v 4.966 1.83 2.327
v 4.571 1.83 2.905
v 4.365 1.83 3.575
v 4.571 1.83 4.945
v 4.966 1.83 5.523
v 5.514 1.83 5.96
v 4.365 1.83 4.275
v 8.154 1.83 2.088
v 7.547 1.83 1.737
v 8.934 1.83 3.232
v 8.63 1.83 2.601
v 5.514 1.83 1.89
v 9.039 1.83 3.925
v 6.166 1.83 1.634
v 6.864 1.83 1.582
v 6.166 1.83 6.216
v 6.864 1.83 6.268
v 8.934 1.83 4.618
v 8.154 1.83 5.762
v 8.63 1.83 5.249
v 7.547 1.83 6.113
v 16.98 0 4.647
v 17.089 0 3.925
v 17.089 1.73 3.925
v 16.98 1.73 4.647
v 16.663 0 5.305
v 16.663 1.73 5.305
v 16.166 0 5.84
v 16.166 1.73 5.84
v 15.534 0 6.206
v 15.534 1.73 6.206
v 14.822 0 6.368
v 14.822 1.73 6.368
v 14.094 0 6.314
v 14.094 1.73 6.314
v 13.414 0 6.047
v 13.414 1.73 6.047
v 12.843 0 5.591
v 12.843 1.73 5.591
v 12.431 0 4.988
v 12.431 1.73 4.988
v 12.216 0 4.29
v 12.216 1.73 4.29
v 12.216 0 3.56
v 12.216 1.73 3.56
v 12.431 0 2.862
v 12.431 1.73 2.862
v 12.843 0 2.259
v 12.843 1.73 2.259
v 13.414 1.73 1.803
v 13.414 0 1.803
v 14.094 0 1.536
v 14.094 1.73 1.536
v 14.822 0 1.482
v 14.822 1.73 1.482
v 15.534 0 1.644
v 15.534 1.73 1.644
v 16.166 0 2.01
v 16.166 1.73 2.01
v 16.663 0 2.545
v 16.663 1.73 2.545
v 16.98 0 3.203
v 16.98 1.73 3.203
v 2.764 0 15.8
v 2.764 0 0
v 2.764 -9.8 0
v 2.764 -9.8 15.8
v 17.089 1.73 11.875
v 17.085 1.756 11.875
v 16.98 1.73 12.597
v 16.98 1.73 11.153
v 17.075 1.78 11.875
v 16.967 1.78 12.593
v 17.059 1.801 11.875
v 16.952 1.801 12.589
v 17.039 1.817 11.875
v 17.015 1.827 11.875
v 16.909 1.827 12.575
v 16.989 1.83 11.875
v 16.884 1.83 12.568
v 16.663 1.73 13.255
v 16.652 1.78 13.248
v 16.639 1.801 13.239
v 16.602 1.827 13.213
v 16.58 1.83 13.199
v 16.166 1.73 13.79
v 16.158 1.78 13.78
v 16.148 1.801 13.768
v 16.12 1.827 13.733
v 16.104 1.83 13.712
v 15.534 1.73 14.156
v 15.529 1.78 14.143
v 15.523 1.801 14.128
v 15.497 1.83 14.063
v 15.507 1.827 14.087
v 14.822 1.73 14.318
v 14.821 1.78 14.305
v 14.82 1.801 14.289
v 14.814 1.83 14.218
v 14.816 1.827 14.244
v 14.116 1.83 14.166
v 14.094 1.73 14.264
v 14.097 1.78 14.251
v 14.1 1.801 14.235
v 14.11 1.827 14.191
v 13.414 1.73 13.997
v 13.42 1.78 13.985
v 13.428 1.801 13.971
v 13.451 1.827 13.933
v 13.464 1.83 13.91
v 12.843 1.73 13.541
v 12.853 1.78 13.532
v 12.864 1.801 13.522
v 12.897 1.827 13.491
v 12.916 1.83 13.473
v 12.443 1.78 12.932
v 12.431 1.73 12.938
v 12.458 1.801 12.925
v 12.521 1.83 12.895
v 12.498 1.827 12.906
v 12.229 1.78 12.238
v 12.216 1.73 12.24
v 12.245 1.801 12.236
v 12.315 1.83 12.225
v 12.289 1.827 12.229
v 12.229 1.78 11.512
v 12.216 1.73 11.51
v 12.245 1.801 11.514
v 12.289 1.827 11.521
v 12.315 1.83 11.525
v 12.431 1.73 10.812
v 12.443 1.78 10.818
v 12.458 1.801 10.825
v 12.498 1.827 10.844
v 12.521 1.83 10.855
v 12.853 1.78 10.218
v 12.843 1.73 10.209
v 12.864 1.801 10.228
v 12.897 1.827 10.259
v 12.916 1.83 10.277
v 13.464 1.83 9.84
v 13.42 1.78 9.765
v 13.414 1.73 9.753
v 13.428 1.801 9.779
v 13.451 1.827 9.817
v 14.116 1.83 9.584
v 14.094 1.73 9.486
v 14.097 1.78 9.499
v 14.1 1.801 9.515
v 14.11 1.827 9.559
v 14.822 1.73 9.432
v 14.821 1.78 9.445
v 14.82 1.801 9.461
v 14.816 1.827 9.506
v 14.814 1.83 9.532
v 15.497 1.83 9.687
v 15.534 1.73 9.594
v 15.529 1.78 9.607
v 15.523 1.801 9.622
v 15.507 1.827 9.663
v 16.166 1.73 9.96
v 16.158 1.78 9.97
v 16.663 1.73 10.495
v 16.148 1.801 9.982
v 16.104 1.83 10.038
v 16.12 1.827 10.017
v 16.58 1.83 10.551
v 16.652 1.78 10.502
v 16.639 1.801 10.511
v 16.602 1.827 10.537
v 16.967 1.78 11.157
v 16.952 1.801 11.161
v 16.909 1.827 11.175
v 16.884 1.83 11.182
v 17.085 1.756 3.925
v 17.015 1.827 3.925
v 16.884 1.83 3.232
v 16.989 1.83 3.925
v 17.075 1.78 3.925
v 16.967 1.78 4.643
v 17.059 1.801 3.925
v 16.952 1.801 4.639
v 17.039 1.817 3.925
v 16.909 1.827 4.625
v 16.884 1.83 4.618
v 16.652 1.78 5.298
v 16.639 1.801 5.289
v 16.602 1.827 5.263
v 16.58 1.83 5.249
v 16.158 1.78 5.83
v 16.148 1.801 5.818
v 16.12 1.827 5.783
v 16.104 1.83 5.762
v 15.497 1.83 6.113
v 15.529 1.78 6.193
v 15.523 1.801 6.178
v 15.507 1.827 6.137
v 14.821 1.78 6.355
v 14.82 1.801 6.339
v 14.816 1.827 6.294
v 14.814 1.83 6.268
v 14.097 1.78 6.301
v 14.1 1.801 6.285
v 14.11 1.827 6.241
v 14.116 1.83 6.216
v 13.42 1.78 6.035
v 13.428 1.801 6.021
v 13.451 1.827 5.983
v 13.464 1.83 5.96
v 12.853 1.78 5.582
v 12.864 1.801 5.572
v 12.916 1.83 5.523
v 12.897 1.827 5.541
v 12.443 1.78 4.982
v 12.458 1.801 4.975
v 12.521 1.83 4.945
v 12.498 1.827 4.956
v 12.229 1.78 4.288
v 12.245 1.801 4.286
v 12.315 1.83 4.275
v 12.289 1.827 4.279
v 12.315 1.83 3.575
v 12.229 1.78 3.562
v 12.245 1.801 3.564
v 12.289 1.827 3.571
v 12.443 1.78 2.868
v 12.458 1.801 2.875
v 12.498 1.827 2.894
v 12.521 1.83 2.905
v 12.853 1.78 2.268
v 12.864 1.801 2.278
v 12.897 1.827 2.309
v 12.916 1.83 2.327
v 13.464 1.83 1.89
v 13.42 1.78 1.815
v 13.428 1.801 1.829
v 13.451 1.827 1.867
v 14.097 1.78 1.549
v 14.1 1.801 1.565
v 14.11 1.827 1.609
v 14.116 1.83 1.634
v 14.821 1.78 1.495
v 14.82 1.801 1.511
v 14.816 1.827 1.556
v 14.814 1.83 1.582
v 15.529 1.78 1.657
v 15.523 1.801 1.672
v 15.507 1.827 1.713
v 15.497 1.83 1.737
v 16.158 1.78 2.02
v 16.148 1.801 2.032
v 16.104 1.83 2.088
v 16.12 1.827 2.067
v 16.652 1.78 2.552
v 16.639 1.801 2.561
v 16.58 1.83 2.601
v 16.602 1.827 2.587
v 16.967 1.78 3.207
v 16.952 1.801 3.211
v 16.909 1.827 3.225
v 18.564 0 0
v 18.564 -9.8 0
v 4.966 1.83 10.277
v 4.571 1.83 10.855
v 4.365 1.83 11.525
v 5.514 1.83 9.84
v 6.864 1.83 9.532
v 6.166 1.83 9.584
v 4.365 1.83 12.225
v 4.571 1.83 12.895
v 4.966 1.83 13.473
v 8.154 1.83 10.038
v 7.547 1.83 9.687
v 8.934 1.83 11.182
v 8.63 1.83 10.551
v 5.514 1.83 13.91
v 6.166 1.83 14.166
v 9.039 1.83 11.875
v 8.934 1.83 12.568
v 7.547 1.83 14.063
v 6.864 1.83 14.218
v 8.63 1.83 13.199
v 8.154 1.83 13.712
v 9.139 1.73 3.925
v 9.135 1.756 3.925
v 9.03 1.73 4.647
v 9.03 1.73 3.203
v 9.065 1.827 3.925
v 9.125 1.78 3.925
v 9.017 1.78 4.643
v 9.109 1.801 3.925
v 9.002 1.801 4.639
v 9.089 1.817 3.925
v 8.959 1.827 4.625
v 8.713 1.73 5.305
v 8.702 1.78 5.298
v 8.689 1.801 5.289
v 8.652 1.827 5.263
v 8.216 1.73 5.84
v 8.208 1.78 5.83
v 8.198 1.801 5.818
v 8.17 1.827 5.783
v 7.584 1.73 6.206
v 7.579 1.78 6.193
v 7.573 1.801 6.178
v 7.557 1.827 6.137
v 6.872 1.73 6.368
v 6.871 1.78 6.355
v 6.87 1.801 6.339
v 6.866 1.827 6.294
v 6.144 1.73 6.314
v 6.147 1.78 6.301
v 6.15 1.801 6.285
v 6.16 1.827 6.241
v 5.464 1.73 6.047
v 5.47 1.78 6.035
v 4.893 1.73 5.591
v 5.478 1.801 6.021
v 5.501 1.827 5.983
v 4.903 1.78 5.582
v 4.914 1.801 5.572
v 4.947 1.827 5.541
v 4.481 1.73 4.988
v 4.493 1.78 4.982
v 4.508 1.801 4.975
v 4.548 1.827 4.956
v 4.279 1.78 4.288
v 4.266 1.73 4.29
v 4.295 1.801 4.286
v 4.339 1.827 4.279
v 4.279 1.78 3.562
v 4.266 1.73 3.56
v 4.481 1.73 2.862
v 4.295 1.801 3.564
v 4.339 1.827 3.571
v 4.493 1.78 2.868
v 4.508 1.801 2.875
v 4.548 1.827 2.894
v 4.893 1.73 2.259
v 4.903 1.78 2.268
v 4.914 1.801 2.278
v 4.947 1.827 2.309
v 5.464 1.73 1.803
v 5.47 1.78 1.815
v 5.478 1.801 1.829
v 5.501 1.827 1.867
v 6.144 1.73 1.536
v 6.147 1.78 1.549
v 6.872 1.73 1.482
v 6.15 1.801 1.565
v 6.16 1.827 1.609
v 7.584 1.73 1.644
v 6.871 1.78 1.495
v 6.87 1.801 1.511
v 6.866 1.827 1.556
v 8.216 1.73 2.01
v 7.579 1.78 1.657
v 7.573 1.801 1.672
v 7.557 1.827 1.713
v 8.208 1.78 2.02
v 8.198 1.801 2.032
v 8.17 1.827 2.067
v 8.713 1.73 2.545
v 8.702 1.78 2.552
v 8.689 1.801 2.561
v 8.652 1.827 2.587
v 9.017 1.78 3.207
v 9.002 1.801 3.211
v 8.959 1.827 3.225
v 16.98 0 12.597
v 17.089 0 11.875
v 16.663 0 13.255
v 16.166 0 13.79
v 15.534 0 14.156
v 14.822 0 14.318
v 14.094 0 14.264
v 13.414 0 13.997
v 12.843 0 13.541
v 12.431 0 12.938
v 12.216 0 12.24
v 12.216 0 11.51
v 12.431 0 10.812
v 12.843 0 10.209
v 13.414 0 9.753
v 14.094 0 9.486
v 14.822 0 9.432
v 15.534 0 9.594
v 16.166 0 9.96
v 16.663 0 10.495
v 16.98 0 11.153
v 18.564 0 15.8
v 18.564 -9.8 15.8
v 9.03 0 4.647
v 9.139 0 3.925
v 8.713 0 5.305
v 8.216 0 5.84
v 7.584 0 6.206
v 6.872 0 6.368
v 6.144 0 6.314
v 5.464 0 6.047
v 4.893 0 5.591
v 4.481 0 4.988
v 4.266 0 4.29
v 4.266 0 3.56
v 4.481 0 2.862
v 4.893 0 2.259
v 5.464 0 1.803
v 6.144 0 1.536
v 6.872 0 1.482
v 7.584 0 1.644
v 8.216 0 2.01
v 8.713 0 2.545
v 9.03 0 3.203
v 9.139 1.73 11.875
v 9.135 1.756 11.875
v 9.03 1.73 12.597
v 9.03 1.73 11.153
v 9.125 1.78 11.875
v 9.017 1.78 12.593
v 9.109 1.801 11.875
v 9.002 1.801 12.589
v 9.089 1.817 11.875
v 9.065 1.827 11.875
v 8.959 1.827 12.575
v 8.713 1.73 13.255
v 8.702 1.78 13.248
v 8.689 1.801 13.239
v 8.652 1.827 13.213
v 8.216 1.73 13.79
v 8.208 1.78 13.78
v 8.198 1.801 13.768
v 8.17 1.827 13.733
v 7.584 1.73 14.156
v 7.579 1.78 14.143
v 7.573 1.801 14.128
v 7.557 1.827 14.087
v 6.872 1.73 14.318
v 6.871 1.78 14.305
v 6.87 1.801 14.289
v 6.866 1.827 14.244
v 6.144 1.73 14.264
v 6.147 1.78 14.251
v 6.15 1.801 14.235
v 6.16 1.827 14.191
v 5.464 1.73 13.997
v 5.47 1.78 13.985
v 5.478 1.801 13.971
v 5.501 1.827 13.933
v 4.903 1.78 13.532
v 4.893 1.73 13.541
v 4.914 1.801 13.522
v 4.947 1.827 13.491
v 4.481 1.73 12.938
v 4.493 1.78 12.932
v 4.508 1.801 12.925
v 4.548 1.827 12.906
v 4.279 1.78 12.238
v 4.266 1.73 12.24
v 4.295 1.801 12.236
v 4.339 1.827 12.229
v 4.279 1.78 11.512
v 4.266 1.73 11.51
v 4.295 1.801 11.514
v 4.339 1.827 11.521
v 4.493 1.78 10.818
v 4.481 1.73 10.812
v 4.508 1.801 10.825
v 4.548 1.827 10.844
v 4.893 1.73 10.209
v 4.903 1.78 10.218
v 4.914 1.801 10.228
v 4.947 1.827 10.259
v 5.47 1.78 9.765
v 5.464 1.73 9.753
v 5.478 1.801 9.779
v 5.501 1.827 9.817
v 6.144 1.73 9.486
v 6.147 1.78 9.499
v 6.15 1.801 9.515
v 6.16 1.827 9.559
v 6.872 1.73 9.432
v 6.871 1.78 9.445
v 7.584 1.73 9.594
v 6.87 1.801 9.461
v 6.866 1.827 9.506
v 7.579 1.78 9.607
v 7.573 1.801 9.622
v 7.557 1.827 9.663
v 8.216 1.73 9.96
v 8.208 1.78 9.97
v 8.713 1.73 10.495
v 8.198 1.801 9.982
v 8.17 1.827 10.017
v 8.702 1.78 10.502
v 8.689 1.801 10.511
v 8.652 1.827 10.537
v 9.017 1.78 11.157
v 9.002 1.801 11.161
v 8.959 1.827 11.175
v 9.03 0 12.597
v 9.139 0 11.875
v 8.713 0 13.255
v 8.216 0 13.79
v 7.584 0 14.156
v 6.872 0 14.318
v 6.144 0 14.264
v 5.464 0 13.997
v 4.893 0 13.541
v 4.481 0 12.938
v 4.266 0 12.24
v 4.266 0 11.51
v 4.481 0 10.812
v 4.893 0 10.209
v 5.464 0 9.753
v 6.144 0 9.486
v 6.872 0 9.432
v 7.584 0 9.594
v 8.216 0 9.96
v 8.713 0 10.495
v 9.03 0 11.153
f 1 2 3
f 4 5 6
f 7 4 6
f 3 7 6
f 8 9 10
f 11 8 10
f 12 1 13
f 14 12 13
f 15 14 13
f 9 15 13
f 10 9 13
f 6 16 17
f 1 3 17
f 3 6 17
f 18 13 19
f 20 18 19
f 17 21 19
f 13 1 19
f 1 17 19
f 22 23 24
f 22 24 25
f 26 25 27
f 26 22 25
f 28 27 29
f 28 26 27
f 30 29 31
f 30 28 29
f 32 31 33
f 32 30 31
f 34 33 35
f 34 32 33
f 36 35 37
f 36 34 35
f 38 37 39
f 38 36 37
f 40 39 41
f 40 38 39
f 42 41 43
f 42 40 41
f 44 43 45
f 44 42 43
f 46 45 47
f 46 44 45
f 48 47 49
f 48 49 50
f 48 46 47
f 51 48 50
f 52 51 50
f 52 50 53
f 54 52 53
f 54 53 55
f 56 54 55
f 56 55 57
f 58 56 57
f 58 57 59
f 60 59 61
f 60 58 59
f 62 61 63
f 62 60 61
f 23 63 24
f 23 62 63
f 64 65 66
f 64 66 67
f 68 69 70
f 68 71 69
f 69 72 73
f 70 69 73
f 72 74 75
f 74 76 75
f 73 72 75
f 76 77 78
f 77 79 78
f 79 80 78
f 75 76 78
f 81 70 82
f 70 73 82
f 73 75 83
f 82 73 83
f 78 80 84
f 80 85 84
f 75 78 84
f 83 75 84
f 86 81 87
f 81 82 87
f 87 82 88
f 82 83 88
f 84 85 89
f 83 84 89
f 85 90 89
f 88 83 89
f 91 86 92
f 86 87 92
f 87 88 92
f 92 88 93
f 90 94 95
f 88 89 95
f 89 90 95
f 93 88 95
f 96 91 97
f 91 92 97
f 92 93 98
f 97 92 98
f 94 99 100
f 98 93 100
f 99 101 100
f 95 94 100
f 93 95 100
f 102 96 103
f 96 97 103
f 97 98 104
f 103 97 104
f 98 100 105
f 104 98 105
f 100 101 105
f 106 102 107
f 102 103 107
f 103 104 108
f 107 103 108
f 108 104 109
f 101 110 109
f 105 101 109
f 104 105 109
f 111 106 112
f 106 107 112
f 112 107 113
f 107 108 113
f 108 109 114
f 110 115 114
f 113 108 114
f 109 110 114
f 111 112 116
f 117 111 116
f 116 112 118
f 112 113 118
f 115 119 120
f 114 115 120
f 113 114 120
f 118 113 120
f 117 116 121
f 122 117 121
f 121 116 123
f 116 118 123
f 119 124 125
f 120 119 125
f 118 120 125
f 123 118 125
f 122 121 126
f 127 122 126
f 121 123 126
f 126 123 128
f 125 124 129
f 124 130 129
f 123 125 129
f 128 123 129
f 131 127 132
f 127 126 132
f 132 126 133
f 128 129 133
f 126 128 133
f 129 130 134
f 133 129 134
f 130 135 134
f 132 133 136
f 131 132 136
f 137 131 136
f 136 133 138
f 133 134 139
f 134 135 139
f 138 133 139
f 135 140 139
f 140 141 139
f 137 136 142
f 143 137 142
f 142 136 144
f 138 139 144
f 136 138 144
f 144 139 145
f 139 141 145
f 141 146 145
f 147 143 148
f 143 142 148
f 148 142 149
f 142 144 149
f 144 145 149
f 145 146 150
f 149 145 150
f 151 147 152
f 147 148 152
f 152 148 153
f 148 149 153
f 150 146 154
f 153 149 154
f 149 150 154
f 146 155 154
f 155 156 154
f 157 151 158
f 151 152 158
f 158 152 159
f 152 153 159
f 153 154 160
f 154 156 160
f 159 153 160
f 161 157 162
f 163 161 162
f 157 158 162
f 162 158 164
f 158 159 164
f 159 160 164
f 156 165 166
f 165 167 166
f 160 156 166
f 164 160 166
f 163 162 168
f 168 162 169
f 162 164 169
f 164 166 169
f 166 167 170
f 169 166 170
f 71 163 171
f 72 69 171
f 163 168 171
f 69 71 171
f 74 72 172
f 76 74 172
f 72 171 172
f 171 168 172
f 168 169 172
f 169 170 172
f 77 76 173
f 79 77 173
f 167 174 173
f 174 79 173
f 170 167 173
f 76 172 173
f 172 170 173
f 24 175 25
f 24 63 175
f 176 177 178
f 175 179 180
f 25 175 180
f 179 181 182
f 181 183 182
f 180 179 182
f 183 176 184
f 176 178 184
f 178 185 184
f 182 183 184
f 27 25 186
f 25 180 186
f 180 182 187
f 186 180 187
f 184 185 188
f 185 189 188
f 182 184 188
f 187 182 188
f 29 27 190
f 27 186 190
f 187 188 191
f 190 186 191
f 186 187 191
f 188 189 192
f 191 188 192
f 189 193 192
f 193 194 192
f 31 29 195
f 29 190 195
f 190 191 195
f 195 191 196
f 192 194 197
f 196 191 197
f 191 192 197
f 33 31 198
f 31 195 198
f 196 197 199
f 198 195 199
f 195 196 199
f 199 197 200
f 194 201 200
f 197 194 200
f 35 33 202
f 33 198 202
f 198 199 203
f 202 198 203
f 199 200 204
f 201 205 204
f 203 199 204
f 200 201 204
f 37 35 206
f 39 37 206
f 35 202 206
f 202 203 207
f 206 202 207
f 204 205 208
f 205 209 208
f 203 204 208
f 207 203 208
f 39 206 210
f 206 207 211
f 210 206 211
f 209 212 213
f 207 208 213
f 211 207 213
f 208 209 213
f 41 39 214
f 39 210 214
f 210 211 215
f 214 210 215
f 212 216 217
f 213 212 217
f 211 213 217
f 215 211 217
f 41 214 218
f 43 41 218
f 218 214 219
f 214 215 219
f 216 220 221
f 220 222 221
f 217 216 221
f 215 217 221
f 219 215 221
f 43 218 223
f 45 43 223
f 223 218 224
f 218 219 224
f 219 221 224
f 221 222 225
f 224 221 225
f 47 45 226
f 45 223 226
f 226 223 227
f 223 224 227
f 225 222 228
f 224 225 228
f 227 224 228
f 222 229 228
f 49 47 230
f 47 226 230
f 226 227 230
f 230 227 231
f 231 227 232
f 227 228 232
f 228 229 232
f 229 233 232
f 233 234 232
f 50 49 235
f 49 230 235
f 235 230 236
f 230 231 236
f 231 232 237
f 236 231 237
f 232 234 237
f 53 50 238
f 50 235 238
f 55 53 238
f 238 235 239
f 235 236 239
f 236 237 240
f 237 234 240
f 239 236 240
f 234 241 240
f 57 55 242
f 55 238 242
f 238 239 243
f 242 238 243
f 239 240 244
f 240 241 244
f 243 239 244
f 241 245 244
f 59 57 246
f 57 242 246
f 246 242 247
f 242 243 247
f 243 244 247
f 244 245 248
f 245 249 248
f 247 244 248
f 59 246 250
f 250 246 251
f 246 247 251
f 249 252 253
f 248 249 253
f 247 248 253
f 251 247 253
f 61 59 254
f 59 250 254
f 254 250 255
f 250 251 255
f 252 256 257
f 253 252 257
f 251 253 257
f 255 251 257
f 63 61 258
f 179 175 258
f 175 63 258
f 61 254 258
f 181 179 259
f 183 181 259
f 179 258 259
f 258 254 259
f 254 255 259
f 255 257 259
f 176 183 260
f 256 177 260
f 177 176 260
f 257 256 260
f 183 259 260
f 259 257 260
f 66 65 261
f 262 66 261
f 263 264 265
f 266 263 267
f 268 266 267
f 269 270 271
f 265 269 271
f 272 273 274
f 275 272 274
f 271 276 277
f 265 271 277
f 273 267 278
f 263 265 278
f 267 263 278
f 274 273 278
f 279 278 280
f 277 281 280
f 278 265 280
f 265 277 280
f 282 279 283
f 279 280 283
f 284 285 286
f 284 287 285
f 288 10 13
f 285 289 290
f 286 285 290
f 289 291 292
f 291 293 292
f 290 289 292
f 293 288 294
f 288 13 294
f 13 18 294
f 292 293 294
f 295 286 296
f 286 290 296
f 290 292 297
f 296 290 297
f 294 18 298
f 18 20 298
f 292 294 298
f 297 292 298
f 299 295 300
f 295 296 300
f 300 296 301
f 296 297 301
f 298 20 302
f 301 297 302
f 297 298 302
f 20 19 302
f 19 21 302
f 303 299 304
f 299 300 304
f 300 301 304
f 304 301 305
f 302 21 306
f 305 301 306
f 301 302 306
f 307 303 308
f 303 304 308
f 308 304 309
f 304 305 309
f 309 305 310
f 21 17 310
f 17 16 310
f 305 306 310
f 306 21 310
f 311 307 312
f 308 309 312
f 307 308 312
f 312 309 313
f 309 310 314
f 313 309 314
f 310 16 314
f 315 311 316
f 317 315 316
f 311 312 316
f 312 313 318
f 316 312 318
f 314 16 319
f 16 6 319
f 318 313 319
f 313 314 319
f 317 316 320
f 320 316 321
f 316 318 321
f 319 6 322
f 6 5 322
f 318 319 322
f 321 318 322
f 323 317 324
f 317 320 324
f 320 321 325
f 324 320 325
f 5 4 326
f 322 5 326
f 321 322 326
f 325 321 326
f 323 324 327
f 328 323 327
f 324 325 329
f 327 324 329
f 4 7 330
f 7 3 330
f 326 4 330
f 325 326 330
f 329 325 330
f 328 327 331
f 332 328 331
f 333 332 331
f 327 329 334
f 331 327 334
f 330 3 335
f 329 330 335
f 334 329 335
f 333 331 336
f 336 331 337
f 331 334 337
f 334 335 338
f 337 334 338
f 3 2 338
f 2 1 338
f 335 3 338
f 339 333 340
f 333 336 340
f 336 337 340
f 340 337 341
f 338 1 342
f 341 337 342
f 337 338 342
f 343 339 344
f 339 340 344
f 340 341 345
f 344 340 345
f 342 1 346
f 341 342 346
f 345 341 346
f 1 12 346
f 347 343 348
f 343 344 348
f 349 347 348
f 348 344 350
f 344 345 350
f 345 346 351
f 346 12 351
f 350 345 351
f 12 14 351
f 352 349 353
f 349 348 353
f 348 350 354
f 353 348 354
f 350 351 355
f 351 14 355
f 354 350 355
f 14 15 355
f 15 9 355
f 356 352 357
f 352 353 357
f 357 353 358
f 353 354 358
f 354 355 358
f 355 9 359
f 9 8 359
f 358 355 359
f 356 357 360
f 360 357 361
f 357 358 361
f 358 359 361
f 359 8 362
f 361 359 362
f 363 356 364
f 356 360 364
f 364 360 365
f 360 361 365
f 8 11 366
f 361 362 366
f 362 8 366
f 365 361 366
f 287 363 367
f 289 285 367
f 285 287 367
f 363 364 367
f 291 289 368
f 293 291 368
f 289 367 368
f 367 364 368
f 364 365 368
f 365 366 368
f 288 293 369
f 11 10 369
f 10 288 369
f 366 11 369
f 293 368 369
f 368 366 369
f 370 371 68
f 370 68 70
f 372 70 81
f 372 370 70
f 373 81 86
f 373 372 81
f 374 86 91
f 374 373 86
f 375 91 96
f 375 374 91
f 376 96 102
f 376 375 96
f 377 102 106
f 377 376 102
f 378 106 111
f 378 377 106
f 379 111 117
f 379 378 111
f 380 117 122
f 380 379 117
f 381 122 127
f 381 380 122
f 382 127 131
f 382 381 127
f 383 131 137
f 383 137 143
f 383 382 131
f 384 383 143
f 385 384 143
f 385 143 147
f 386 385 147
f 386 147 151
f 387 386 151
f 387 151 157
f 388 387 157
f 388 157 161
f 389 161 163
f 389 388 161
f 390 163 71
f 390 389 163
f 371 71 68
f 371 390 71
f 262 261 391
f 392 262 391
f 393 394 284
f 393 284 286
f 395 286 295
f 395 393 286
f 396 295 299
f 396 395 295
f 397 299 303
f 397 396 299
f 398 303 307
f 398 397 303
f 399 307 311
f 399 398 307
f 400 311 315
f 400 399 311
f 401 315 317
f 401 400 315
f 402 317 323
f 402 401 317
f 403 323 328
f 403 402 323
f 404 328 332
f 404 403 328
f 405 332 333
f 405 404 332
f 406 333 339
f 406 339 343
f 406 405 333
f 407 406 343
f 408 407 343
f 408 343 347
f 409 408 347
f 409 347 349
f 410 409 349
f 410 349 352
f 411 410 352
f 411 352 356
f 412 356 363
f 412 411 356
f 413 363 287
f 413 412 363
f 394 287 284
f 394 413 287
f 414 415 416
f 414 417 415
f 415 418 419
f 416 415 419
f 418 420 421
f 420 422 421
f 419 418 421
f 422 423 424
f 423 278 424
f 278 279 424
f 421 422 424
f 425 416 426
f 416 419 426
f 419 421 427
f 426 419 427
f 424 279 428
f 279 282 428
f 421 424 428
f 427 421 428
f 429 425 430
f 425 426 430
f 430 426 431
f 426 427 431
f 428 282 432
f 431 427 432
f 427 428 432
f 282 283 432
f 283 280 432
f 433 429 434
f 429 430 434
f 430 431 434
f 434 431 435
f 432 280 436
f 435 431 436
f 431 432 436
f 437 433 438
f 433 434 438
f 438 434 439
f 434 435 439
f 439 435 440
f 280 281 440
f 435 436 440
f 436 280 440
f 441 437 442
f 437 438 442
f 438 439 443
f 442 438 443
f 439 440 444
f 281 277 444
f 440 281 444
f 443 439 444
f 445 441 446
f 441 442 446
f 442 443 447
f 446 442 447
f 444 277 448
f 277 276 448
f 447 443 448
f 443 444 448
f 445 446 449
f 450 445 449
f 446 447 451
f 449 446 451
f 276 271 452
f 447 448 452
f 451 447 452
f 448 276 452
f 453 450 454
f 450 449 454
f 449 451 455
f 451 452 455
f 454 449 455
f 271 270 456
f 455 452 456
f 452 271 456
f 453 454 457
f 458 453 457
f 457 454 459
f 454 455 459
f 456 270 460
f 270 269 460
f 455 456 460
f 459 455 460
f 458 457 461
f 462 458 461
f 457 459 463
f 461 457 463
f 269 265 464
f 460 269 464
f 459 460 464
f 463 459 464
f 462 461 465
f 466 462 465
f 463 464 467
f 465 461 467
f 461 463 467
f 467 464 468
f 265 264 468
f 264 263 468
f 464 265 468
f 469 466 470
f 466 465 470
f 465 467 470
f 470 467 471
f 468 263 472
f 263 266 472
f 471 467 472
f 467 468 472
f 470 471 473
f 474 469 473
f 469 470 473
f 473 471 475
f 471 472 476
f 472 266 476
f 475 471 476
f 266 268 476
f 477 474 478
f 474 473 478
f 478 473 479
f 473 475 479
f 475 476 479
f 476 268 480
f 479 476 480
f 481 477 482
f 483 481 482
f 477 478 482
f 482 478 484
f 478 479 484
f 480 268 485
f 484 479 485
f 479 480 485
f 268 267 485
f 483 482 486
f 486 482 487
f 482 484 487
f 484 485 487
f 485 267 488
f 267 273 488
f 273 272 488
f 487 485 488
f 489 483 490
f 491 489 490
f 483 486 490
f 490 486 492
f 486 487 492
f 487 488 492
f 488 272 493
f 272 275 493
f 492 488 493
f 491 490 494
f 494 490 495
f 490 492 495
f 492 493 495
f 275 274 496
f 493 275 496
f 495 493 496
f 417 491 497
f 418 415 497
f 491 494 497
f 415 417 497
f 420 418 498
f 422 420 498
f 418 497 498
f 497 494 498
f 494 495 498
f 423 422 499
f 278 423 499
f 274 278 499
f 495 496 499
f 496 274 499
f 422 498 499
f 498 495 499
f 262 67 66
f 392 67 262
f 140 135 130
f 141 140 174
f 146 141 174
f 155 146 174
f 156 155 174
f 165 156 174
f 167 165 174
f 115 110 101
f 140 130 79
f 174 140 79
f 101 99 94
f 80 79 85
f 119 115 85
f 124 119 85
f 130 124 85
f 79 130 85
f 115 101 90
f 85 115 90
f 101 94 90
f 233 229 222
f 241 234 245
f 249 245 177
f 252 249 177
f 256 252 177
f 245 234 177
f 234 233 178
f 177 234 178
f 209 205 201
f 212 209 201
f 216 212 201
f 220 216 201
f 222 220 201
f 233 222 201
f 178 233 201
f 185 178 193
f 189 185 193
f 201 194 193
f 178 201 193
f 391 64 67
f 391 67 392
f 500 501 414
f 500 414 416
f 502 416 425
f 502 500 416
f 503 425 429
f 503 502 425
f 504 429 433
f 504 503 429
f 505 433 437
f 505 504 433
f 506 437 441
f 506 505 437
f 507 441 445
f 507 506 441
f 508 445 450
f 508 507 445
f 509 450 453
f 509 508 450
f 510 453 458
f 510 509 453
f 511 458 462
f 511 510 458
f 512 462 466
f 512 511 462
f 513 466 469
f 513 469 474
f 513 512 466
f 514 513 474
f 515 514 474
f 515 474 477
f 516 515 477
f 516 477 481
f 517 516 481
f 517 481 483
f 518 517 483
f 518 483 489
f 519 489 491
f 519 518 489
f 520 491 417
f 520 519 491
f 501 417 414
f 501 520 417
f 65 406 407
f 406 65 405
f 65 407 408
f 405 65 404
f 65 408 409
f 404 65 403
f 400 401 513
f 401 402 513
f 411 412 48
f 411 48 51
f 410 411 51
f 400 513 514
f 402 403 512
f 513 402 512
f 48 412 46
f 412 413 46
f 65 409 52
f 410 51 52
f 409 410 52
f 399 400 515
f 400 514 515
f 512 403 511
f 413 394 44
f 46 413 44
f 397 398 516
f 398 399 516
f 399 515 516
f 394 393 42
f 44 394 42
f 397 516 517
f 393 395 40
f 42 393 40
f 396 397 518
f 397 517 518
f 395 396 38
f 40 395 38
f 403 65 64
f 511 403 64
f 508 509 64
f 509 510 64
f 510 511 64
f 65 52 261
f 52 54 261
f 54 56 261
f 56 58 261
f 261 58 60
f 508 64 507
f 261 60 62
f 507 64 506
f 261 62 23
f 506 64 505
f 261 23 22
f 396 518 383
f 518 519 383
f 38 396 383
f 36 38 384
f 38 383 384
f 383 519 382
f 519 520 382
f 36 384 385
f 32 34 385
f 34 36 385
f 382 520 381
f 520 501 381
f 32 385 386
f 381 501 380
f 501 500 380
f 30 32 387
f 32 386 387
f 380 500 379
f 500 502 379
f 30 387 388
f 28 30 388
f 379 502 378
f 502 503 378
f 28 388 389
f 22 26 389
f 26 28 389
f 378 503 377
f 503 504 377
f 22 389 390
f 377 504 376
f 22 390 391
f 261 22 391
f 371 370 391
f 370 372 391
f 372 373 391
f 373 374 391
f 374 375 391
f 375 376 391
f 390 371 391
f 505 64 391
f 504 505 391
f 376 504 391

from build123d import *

# Parameters (mm, degrees)
F0_W     = 15.8
F0_H     = 15.8
F1_DEPTH = 9.8
F2_R     = 2.45
F3_DEPTH = 1.83
F4_R     = 0.1


with BuildPart() as f1:
    # F0 (on Front) → F1 (new body)
    with BuildSketch(Plane.XZ):
        with Locations((10.663698, 7.9)):
            Rectangle(F0_W, F0_H)
    extrude(amount=F1_DEPTH)

    # F2 (on Front) → F3 (join)
    with BuildSketch(Plane.XZ):
        with Locations((6.688698, 11.875)):
            Circle(F2_R)
        with Locations((14.638698, 11.875)):
            Circle(F2_R)
        with Locations((6.688698, 3.925)):
            Circle(F2_R)
        with Locations((14.638698, 3.925)):
            Circle(F2_R)
    extrude(amount=-F3_DEPTH)

    # F4
    f4_edges = [f1.edges().sort_by_distance(p)[0] for p in [
        (12.188698, 1.83, 11.875),
        (4.238698, 1.83, 11.875),
        (4.238698, 1.83, 3.925),
        (12.188698, 1.83, 3.925),
    ]]
    fillet(f4_edges, radius=F4_R)


solid = f1.part
